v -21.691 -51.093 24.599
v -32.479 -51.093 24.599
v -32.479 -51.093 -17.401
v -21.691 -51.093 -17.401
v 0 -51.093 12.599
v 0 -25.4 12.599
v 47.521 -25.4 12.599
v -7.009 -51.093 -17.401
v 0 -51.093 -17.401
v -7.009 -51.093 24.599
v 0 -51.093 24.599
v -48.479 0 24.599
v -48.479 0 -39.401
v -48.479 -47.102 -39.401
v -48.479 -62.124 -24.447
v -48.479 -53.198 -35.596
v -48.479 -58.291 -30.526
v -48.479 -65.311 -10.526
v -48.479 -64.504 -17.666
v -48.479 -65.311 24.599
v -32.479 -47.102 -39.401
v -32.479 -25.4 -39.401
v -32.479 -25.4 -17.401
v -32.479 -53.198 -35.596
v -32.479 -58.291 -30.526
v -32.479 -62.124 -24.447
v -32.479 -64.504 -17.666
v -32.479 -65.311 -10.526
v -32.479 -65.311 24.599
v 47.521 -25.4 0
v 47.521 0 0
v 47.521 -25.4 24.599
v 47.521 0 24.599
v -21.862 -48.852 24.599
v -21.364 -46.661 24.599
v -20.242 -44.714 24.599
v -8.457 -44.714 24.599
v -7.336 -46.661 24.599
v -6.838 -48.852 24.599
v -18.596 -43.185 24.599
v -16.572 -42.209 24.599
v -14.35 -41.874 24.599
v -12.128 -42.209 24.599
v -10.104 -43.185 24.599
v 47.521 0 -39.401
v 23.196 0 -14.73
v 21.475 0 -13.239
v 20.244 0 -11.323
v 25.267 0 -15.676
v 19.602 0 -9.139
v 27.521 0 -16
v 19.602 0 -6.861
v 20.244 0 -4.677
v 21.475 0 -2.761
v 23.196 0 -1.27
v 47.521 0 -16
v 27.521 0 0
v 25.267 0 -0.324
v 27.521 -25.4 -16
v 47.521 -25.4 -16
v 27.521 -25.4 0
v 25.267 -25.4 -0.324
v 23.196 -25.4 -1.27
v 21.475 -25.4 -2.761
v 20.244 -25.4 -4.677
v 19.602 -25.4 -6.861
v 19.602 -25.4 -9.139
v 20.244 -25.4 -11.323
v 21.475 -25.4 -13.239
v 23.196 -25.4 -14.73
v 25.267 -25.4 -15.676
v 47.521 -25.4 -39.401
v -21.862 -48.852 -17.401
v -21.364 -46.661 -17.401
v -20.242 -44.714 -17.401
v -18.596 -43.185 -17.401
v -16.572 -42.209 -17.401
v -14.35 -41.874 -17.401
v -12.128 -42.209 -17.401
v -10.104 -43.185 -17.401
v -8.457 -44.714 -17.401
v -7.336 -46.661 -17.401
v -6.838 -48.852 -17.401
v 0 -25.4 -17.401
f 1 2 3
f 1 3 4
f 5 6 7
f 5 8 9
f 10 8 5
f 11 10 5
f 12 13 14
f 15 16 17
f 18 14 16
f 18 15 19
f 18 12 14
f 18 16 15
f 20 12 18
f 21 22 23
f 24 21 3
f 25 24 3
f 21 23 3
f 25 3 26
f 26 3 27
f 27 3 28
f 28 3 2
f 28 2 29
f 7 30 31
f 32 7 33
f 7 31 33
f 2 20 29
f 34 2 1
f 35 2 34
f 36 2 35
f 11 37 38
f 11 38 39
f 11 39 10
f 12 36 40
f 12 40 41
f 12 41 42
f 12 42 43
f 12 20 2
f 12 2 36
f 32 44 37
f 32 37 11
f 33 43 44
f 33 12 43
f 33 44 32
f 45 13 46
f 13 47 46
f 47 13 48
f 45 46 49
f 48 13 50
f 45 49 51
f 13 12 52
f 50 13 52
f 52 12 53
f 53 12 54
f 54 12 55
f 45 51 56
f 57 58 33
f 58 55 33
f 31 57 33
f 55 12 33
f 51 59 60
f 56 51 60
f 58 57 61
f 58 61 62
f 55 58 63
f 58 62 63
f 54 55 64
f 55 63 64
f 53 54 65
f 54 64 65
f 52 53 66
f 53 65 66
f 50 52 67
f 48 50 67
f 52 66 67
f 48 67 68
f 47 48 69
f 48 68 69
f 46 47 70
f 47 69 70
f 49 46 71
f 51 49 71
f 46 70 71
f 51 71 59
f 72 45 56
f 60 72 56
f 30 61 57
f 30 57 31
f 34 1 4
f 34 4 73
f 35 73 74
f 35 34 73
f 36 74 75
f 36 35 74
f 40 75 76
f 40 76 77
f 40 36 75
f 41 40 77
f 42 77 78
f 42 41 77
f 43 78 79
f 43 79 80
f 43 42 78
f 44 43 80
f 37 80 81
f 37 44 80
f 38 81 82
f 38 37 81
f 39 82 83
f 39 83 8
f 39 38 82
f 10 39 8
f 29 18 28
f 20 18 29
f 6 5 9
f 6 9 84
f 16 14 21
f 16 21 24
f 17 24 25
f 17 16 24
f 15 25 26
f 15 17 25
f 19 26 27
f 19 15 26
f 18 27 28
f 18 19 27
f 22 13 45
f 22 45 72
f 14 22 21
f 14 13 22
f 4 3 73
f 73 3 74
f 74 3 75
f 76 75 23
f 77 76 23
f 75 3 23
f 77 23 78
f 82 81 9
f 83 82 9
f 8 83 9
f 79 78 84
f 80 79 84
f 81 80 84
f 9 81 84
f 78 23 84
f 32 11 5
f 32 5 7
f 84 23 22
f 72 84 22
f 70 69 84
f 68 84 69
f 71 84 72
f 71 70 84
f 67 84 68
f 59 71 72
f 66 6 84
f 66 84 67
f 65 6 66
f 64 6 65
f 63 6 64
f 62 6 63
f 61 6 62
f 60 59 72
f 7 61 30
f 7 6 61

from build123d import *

# Parameters (mm, degrees)
F0_W     = 96
F0_H     = 64
F1_DEPTH = 25.4
F2_W     = 20
F2_H     = 16
F3_DEPTH = 25.4
F5_DEPTH = 16
F7_DEPTH = 42
F9_DEPTH = 12


with BuildPart() as f1:
    # F0 (on Front) → F1 (new body)
    with BuildSketch(Plane.XZ):
        with Locations((-0.479123, -7.401277)):
            Rectangle(F0_W, F0_H)
    extrude(amount=F1_DEPTH)

    # F2 (on face) → F3 (cut)
    with BuildSketch(Plane.XZ.offset(25.4)):
        with BuildLine():
            Line((27.520877, -16), (27.520877, 0))
            ThreePointArc((27.520877, 0), (19.520877, -8), (27.520877, -16))
        make_face()
        with Locations((37.520877, -8)):
            Rectangle(F2_W, F2_H)
    extrude(amount=-F3_DEPTH, mode=Mode.SUBTRACT)

    # F4 (on face) → F5 (join)
    with BuildSketch(Plane(origin=(-48.479123, 0, 0), x_dir=(0, -1, 0), z_dir=(-1, 0, 0))):
        with BuildLine():
            Line((65.310675, 24.598723), (25.4, 24.598723))
            Line((25.4, 24.598723), (25.4, -39.401277))
            Line((25.4, -39.401277), (47.101744, -39.401277))
            ThreePointArc((47.101744, -39.401277), (60.378314, -27.594341), (65.310675, -10.525571))
            Line((65.310675, -10.525571), (65.310675, 24.598723))
        make_face()
    extrude(amount=-F5_DEPTH)

    # F6 (on face) → F7 (join)
    with BuildSketch(Plane.XY.offset(24.598723)):
        with BuildLine():
            Line((0, -25.4), (-32.479123, -25.4))
            Line((-32.479123, -25.4), (-32.479123, -51.092945))
            Line((-32.479123, -51.092945), (-21.691002, -51.092945))
            ThreePointArc((-21.691002, -51.092945), (-14.349926, -41.873779), (-7.008849, -51.092945))
            Line((-7.008849, -51.092945), (0, -51.092945))
            Line((0, -51.092945), (0, -25.4))
        make_face()
    extrude(amount=-F7_DEPTH)

    # F8 (on face) → F9 (join)
    with BuildSketch(Plane.XY.offset(24.598723)):
        Polygon((0, -51.092945), (47.520877, -25.4), (0, -25.4), align=None)
    extrude(amount=-F9_DEPTH)


solid = f1.part
